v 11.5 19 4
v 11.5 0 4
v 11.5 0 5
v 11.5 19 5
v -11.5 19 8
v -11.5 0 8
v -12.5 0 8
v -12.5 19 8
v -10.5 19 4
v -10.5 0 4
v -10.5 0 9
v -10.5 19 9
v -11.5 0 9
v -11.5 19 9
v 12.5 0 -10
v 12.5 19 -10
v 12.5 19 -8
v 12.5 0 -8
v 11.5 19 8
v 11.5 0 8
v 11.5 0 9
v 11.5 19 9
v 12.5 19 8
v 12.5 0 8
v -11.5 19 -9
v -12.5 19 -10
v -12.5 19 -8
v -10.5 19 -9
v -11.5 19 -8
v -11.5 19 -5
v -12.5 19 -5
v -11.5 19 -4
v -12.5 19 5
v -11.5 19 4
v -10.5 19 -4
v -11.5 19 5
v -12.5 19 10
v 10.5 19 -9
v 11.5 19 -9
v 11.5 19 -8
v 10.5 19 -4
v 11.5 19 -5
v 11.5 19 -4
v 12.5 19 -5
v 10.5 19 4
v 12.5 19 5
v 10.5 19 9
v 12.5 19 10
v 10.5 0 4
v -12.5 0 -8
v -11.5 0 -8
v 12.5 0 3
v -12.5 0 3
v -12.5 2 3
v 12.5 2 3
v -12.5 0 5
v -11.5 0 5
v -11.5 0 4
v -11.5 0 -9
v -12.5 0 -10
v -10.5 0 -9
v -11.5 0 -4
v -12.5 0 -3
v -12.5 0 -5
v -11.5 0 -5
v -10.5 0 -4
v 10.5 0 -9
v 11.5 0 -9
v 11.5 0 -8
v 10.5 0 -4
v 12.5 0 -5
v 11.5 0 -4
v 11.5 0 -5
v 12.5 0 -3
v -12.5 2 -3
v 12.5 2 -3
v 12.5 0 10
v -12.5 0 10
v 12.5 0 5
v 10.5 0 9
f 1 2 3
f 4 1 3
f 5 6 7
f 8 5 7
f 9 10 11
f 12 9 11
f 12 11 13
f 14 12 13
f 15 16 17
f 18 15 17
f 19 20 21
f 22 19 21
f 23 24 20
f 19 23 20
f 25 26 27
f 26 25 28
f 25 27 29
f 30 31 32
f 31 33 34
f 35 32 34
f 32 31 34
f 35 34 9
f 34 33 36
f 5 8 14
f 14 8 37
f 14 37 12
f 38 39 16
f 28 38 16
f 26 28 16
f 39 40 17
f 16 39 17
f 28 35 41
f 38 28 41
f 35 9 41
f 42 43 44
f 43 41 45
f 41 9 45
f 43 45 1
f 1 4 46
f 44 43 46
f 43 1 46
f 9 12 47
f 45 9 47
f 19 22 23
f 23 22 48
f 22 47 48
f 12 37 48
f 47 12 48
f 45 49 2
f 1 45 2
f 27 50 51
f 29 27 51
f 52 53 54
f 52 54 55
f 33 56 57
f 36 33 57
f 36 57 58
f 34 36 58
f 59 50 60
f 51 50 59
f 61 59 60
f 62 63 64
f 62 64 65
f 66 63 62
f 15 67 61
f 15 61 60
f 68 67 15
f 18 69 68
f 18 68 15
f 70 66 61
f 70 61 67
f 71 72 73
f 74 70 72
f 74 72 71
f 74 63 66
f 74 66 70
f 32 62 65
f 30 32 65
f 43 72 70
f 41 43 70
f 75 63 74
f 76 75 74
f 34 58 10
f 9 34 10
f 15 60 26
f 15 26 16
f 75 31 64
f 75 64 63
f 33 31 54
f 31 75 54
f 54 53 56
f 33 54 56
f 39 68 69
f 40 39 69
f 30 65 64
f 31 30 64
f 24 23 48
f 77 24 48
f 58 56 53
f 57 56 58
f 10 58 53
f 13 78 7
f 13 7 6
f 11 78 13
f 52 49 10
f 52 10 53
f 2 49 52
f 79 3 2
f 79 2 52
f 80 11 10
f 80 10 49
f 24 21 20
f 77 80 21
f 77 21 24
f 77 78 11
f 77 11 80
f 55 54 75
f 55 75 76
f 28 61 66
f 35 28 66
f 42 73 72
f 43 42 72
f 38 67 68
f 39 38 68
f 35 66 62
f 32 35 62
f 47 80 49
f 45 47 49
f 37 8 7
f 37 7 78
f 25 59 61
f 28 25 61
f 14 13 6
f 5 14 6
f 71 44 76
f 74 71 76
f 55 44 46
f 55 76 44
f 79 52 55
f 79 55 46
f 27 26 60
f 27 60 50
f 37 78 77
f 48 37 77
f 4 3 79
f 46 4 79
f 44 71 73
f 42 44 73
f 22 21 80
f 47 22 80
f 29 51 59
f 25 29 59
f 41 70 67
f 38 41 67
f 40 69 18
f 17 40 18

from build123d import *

# Parameters (mm, degrees)
F0_W     = 25
F0_H     = 20
F1_DEPTH = 19
F2_W     = 25
F2_H     = 6
F3_DEPTH = 2
F5_DEPTH = 19.001


with BuildPart() as f1:
    # F0 (on Front) → F1 (new body)
    with BuildSketch(Plane.XZ):
        Rectangle(F0_W, F0_H)
    extrude(amount=-F1_DEPTH)

    # F2 (on face) → F3 (cut)
    with BuildSketch(Plane.XZ):
        Rectangle(F2_W, F2_H)
    extrude(amount=-F3_DEPTH, mode=Mode.SUBTRACT)

    # F4 (on face) → F5 (cut, through all)
    with BuildSketch(Plane.XZ):
        Polygon((-11.5, 8), (-12.5, 8), (-12.5, 5), (-11.5, 5), (-11.5, 4), (-10.5, 4), (-10.5, 9), (-11.5, 9), align=None)
        Polygon((11.5, 8), (11.5, 9), (10.5, 9), (10.5, 4), (11.5, 4), (11.5, 5), (12.5, 5), (12.5, 8), align=None)
        Polygon((-11.5, -4), (-11.5, -5), (-12.5, -5), (-12.5, -8), (-11.5, -8), (-11.5, -9), (-10.5, -9), (-10.5, -4), align=None)
        Polygon((12.5, -5), (11.5, -5), (11.5, -4), (10.5, -4), (10.5, -9), (11.5, -9), (11.5, -8), (12.5, -8), align=None)
    extrude(amount=-F5_DEPTH, mode=Mode.SUBTRACT)


solid = f1.part
